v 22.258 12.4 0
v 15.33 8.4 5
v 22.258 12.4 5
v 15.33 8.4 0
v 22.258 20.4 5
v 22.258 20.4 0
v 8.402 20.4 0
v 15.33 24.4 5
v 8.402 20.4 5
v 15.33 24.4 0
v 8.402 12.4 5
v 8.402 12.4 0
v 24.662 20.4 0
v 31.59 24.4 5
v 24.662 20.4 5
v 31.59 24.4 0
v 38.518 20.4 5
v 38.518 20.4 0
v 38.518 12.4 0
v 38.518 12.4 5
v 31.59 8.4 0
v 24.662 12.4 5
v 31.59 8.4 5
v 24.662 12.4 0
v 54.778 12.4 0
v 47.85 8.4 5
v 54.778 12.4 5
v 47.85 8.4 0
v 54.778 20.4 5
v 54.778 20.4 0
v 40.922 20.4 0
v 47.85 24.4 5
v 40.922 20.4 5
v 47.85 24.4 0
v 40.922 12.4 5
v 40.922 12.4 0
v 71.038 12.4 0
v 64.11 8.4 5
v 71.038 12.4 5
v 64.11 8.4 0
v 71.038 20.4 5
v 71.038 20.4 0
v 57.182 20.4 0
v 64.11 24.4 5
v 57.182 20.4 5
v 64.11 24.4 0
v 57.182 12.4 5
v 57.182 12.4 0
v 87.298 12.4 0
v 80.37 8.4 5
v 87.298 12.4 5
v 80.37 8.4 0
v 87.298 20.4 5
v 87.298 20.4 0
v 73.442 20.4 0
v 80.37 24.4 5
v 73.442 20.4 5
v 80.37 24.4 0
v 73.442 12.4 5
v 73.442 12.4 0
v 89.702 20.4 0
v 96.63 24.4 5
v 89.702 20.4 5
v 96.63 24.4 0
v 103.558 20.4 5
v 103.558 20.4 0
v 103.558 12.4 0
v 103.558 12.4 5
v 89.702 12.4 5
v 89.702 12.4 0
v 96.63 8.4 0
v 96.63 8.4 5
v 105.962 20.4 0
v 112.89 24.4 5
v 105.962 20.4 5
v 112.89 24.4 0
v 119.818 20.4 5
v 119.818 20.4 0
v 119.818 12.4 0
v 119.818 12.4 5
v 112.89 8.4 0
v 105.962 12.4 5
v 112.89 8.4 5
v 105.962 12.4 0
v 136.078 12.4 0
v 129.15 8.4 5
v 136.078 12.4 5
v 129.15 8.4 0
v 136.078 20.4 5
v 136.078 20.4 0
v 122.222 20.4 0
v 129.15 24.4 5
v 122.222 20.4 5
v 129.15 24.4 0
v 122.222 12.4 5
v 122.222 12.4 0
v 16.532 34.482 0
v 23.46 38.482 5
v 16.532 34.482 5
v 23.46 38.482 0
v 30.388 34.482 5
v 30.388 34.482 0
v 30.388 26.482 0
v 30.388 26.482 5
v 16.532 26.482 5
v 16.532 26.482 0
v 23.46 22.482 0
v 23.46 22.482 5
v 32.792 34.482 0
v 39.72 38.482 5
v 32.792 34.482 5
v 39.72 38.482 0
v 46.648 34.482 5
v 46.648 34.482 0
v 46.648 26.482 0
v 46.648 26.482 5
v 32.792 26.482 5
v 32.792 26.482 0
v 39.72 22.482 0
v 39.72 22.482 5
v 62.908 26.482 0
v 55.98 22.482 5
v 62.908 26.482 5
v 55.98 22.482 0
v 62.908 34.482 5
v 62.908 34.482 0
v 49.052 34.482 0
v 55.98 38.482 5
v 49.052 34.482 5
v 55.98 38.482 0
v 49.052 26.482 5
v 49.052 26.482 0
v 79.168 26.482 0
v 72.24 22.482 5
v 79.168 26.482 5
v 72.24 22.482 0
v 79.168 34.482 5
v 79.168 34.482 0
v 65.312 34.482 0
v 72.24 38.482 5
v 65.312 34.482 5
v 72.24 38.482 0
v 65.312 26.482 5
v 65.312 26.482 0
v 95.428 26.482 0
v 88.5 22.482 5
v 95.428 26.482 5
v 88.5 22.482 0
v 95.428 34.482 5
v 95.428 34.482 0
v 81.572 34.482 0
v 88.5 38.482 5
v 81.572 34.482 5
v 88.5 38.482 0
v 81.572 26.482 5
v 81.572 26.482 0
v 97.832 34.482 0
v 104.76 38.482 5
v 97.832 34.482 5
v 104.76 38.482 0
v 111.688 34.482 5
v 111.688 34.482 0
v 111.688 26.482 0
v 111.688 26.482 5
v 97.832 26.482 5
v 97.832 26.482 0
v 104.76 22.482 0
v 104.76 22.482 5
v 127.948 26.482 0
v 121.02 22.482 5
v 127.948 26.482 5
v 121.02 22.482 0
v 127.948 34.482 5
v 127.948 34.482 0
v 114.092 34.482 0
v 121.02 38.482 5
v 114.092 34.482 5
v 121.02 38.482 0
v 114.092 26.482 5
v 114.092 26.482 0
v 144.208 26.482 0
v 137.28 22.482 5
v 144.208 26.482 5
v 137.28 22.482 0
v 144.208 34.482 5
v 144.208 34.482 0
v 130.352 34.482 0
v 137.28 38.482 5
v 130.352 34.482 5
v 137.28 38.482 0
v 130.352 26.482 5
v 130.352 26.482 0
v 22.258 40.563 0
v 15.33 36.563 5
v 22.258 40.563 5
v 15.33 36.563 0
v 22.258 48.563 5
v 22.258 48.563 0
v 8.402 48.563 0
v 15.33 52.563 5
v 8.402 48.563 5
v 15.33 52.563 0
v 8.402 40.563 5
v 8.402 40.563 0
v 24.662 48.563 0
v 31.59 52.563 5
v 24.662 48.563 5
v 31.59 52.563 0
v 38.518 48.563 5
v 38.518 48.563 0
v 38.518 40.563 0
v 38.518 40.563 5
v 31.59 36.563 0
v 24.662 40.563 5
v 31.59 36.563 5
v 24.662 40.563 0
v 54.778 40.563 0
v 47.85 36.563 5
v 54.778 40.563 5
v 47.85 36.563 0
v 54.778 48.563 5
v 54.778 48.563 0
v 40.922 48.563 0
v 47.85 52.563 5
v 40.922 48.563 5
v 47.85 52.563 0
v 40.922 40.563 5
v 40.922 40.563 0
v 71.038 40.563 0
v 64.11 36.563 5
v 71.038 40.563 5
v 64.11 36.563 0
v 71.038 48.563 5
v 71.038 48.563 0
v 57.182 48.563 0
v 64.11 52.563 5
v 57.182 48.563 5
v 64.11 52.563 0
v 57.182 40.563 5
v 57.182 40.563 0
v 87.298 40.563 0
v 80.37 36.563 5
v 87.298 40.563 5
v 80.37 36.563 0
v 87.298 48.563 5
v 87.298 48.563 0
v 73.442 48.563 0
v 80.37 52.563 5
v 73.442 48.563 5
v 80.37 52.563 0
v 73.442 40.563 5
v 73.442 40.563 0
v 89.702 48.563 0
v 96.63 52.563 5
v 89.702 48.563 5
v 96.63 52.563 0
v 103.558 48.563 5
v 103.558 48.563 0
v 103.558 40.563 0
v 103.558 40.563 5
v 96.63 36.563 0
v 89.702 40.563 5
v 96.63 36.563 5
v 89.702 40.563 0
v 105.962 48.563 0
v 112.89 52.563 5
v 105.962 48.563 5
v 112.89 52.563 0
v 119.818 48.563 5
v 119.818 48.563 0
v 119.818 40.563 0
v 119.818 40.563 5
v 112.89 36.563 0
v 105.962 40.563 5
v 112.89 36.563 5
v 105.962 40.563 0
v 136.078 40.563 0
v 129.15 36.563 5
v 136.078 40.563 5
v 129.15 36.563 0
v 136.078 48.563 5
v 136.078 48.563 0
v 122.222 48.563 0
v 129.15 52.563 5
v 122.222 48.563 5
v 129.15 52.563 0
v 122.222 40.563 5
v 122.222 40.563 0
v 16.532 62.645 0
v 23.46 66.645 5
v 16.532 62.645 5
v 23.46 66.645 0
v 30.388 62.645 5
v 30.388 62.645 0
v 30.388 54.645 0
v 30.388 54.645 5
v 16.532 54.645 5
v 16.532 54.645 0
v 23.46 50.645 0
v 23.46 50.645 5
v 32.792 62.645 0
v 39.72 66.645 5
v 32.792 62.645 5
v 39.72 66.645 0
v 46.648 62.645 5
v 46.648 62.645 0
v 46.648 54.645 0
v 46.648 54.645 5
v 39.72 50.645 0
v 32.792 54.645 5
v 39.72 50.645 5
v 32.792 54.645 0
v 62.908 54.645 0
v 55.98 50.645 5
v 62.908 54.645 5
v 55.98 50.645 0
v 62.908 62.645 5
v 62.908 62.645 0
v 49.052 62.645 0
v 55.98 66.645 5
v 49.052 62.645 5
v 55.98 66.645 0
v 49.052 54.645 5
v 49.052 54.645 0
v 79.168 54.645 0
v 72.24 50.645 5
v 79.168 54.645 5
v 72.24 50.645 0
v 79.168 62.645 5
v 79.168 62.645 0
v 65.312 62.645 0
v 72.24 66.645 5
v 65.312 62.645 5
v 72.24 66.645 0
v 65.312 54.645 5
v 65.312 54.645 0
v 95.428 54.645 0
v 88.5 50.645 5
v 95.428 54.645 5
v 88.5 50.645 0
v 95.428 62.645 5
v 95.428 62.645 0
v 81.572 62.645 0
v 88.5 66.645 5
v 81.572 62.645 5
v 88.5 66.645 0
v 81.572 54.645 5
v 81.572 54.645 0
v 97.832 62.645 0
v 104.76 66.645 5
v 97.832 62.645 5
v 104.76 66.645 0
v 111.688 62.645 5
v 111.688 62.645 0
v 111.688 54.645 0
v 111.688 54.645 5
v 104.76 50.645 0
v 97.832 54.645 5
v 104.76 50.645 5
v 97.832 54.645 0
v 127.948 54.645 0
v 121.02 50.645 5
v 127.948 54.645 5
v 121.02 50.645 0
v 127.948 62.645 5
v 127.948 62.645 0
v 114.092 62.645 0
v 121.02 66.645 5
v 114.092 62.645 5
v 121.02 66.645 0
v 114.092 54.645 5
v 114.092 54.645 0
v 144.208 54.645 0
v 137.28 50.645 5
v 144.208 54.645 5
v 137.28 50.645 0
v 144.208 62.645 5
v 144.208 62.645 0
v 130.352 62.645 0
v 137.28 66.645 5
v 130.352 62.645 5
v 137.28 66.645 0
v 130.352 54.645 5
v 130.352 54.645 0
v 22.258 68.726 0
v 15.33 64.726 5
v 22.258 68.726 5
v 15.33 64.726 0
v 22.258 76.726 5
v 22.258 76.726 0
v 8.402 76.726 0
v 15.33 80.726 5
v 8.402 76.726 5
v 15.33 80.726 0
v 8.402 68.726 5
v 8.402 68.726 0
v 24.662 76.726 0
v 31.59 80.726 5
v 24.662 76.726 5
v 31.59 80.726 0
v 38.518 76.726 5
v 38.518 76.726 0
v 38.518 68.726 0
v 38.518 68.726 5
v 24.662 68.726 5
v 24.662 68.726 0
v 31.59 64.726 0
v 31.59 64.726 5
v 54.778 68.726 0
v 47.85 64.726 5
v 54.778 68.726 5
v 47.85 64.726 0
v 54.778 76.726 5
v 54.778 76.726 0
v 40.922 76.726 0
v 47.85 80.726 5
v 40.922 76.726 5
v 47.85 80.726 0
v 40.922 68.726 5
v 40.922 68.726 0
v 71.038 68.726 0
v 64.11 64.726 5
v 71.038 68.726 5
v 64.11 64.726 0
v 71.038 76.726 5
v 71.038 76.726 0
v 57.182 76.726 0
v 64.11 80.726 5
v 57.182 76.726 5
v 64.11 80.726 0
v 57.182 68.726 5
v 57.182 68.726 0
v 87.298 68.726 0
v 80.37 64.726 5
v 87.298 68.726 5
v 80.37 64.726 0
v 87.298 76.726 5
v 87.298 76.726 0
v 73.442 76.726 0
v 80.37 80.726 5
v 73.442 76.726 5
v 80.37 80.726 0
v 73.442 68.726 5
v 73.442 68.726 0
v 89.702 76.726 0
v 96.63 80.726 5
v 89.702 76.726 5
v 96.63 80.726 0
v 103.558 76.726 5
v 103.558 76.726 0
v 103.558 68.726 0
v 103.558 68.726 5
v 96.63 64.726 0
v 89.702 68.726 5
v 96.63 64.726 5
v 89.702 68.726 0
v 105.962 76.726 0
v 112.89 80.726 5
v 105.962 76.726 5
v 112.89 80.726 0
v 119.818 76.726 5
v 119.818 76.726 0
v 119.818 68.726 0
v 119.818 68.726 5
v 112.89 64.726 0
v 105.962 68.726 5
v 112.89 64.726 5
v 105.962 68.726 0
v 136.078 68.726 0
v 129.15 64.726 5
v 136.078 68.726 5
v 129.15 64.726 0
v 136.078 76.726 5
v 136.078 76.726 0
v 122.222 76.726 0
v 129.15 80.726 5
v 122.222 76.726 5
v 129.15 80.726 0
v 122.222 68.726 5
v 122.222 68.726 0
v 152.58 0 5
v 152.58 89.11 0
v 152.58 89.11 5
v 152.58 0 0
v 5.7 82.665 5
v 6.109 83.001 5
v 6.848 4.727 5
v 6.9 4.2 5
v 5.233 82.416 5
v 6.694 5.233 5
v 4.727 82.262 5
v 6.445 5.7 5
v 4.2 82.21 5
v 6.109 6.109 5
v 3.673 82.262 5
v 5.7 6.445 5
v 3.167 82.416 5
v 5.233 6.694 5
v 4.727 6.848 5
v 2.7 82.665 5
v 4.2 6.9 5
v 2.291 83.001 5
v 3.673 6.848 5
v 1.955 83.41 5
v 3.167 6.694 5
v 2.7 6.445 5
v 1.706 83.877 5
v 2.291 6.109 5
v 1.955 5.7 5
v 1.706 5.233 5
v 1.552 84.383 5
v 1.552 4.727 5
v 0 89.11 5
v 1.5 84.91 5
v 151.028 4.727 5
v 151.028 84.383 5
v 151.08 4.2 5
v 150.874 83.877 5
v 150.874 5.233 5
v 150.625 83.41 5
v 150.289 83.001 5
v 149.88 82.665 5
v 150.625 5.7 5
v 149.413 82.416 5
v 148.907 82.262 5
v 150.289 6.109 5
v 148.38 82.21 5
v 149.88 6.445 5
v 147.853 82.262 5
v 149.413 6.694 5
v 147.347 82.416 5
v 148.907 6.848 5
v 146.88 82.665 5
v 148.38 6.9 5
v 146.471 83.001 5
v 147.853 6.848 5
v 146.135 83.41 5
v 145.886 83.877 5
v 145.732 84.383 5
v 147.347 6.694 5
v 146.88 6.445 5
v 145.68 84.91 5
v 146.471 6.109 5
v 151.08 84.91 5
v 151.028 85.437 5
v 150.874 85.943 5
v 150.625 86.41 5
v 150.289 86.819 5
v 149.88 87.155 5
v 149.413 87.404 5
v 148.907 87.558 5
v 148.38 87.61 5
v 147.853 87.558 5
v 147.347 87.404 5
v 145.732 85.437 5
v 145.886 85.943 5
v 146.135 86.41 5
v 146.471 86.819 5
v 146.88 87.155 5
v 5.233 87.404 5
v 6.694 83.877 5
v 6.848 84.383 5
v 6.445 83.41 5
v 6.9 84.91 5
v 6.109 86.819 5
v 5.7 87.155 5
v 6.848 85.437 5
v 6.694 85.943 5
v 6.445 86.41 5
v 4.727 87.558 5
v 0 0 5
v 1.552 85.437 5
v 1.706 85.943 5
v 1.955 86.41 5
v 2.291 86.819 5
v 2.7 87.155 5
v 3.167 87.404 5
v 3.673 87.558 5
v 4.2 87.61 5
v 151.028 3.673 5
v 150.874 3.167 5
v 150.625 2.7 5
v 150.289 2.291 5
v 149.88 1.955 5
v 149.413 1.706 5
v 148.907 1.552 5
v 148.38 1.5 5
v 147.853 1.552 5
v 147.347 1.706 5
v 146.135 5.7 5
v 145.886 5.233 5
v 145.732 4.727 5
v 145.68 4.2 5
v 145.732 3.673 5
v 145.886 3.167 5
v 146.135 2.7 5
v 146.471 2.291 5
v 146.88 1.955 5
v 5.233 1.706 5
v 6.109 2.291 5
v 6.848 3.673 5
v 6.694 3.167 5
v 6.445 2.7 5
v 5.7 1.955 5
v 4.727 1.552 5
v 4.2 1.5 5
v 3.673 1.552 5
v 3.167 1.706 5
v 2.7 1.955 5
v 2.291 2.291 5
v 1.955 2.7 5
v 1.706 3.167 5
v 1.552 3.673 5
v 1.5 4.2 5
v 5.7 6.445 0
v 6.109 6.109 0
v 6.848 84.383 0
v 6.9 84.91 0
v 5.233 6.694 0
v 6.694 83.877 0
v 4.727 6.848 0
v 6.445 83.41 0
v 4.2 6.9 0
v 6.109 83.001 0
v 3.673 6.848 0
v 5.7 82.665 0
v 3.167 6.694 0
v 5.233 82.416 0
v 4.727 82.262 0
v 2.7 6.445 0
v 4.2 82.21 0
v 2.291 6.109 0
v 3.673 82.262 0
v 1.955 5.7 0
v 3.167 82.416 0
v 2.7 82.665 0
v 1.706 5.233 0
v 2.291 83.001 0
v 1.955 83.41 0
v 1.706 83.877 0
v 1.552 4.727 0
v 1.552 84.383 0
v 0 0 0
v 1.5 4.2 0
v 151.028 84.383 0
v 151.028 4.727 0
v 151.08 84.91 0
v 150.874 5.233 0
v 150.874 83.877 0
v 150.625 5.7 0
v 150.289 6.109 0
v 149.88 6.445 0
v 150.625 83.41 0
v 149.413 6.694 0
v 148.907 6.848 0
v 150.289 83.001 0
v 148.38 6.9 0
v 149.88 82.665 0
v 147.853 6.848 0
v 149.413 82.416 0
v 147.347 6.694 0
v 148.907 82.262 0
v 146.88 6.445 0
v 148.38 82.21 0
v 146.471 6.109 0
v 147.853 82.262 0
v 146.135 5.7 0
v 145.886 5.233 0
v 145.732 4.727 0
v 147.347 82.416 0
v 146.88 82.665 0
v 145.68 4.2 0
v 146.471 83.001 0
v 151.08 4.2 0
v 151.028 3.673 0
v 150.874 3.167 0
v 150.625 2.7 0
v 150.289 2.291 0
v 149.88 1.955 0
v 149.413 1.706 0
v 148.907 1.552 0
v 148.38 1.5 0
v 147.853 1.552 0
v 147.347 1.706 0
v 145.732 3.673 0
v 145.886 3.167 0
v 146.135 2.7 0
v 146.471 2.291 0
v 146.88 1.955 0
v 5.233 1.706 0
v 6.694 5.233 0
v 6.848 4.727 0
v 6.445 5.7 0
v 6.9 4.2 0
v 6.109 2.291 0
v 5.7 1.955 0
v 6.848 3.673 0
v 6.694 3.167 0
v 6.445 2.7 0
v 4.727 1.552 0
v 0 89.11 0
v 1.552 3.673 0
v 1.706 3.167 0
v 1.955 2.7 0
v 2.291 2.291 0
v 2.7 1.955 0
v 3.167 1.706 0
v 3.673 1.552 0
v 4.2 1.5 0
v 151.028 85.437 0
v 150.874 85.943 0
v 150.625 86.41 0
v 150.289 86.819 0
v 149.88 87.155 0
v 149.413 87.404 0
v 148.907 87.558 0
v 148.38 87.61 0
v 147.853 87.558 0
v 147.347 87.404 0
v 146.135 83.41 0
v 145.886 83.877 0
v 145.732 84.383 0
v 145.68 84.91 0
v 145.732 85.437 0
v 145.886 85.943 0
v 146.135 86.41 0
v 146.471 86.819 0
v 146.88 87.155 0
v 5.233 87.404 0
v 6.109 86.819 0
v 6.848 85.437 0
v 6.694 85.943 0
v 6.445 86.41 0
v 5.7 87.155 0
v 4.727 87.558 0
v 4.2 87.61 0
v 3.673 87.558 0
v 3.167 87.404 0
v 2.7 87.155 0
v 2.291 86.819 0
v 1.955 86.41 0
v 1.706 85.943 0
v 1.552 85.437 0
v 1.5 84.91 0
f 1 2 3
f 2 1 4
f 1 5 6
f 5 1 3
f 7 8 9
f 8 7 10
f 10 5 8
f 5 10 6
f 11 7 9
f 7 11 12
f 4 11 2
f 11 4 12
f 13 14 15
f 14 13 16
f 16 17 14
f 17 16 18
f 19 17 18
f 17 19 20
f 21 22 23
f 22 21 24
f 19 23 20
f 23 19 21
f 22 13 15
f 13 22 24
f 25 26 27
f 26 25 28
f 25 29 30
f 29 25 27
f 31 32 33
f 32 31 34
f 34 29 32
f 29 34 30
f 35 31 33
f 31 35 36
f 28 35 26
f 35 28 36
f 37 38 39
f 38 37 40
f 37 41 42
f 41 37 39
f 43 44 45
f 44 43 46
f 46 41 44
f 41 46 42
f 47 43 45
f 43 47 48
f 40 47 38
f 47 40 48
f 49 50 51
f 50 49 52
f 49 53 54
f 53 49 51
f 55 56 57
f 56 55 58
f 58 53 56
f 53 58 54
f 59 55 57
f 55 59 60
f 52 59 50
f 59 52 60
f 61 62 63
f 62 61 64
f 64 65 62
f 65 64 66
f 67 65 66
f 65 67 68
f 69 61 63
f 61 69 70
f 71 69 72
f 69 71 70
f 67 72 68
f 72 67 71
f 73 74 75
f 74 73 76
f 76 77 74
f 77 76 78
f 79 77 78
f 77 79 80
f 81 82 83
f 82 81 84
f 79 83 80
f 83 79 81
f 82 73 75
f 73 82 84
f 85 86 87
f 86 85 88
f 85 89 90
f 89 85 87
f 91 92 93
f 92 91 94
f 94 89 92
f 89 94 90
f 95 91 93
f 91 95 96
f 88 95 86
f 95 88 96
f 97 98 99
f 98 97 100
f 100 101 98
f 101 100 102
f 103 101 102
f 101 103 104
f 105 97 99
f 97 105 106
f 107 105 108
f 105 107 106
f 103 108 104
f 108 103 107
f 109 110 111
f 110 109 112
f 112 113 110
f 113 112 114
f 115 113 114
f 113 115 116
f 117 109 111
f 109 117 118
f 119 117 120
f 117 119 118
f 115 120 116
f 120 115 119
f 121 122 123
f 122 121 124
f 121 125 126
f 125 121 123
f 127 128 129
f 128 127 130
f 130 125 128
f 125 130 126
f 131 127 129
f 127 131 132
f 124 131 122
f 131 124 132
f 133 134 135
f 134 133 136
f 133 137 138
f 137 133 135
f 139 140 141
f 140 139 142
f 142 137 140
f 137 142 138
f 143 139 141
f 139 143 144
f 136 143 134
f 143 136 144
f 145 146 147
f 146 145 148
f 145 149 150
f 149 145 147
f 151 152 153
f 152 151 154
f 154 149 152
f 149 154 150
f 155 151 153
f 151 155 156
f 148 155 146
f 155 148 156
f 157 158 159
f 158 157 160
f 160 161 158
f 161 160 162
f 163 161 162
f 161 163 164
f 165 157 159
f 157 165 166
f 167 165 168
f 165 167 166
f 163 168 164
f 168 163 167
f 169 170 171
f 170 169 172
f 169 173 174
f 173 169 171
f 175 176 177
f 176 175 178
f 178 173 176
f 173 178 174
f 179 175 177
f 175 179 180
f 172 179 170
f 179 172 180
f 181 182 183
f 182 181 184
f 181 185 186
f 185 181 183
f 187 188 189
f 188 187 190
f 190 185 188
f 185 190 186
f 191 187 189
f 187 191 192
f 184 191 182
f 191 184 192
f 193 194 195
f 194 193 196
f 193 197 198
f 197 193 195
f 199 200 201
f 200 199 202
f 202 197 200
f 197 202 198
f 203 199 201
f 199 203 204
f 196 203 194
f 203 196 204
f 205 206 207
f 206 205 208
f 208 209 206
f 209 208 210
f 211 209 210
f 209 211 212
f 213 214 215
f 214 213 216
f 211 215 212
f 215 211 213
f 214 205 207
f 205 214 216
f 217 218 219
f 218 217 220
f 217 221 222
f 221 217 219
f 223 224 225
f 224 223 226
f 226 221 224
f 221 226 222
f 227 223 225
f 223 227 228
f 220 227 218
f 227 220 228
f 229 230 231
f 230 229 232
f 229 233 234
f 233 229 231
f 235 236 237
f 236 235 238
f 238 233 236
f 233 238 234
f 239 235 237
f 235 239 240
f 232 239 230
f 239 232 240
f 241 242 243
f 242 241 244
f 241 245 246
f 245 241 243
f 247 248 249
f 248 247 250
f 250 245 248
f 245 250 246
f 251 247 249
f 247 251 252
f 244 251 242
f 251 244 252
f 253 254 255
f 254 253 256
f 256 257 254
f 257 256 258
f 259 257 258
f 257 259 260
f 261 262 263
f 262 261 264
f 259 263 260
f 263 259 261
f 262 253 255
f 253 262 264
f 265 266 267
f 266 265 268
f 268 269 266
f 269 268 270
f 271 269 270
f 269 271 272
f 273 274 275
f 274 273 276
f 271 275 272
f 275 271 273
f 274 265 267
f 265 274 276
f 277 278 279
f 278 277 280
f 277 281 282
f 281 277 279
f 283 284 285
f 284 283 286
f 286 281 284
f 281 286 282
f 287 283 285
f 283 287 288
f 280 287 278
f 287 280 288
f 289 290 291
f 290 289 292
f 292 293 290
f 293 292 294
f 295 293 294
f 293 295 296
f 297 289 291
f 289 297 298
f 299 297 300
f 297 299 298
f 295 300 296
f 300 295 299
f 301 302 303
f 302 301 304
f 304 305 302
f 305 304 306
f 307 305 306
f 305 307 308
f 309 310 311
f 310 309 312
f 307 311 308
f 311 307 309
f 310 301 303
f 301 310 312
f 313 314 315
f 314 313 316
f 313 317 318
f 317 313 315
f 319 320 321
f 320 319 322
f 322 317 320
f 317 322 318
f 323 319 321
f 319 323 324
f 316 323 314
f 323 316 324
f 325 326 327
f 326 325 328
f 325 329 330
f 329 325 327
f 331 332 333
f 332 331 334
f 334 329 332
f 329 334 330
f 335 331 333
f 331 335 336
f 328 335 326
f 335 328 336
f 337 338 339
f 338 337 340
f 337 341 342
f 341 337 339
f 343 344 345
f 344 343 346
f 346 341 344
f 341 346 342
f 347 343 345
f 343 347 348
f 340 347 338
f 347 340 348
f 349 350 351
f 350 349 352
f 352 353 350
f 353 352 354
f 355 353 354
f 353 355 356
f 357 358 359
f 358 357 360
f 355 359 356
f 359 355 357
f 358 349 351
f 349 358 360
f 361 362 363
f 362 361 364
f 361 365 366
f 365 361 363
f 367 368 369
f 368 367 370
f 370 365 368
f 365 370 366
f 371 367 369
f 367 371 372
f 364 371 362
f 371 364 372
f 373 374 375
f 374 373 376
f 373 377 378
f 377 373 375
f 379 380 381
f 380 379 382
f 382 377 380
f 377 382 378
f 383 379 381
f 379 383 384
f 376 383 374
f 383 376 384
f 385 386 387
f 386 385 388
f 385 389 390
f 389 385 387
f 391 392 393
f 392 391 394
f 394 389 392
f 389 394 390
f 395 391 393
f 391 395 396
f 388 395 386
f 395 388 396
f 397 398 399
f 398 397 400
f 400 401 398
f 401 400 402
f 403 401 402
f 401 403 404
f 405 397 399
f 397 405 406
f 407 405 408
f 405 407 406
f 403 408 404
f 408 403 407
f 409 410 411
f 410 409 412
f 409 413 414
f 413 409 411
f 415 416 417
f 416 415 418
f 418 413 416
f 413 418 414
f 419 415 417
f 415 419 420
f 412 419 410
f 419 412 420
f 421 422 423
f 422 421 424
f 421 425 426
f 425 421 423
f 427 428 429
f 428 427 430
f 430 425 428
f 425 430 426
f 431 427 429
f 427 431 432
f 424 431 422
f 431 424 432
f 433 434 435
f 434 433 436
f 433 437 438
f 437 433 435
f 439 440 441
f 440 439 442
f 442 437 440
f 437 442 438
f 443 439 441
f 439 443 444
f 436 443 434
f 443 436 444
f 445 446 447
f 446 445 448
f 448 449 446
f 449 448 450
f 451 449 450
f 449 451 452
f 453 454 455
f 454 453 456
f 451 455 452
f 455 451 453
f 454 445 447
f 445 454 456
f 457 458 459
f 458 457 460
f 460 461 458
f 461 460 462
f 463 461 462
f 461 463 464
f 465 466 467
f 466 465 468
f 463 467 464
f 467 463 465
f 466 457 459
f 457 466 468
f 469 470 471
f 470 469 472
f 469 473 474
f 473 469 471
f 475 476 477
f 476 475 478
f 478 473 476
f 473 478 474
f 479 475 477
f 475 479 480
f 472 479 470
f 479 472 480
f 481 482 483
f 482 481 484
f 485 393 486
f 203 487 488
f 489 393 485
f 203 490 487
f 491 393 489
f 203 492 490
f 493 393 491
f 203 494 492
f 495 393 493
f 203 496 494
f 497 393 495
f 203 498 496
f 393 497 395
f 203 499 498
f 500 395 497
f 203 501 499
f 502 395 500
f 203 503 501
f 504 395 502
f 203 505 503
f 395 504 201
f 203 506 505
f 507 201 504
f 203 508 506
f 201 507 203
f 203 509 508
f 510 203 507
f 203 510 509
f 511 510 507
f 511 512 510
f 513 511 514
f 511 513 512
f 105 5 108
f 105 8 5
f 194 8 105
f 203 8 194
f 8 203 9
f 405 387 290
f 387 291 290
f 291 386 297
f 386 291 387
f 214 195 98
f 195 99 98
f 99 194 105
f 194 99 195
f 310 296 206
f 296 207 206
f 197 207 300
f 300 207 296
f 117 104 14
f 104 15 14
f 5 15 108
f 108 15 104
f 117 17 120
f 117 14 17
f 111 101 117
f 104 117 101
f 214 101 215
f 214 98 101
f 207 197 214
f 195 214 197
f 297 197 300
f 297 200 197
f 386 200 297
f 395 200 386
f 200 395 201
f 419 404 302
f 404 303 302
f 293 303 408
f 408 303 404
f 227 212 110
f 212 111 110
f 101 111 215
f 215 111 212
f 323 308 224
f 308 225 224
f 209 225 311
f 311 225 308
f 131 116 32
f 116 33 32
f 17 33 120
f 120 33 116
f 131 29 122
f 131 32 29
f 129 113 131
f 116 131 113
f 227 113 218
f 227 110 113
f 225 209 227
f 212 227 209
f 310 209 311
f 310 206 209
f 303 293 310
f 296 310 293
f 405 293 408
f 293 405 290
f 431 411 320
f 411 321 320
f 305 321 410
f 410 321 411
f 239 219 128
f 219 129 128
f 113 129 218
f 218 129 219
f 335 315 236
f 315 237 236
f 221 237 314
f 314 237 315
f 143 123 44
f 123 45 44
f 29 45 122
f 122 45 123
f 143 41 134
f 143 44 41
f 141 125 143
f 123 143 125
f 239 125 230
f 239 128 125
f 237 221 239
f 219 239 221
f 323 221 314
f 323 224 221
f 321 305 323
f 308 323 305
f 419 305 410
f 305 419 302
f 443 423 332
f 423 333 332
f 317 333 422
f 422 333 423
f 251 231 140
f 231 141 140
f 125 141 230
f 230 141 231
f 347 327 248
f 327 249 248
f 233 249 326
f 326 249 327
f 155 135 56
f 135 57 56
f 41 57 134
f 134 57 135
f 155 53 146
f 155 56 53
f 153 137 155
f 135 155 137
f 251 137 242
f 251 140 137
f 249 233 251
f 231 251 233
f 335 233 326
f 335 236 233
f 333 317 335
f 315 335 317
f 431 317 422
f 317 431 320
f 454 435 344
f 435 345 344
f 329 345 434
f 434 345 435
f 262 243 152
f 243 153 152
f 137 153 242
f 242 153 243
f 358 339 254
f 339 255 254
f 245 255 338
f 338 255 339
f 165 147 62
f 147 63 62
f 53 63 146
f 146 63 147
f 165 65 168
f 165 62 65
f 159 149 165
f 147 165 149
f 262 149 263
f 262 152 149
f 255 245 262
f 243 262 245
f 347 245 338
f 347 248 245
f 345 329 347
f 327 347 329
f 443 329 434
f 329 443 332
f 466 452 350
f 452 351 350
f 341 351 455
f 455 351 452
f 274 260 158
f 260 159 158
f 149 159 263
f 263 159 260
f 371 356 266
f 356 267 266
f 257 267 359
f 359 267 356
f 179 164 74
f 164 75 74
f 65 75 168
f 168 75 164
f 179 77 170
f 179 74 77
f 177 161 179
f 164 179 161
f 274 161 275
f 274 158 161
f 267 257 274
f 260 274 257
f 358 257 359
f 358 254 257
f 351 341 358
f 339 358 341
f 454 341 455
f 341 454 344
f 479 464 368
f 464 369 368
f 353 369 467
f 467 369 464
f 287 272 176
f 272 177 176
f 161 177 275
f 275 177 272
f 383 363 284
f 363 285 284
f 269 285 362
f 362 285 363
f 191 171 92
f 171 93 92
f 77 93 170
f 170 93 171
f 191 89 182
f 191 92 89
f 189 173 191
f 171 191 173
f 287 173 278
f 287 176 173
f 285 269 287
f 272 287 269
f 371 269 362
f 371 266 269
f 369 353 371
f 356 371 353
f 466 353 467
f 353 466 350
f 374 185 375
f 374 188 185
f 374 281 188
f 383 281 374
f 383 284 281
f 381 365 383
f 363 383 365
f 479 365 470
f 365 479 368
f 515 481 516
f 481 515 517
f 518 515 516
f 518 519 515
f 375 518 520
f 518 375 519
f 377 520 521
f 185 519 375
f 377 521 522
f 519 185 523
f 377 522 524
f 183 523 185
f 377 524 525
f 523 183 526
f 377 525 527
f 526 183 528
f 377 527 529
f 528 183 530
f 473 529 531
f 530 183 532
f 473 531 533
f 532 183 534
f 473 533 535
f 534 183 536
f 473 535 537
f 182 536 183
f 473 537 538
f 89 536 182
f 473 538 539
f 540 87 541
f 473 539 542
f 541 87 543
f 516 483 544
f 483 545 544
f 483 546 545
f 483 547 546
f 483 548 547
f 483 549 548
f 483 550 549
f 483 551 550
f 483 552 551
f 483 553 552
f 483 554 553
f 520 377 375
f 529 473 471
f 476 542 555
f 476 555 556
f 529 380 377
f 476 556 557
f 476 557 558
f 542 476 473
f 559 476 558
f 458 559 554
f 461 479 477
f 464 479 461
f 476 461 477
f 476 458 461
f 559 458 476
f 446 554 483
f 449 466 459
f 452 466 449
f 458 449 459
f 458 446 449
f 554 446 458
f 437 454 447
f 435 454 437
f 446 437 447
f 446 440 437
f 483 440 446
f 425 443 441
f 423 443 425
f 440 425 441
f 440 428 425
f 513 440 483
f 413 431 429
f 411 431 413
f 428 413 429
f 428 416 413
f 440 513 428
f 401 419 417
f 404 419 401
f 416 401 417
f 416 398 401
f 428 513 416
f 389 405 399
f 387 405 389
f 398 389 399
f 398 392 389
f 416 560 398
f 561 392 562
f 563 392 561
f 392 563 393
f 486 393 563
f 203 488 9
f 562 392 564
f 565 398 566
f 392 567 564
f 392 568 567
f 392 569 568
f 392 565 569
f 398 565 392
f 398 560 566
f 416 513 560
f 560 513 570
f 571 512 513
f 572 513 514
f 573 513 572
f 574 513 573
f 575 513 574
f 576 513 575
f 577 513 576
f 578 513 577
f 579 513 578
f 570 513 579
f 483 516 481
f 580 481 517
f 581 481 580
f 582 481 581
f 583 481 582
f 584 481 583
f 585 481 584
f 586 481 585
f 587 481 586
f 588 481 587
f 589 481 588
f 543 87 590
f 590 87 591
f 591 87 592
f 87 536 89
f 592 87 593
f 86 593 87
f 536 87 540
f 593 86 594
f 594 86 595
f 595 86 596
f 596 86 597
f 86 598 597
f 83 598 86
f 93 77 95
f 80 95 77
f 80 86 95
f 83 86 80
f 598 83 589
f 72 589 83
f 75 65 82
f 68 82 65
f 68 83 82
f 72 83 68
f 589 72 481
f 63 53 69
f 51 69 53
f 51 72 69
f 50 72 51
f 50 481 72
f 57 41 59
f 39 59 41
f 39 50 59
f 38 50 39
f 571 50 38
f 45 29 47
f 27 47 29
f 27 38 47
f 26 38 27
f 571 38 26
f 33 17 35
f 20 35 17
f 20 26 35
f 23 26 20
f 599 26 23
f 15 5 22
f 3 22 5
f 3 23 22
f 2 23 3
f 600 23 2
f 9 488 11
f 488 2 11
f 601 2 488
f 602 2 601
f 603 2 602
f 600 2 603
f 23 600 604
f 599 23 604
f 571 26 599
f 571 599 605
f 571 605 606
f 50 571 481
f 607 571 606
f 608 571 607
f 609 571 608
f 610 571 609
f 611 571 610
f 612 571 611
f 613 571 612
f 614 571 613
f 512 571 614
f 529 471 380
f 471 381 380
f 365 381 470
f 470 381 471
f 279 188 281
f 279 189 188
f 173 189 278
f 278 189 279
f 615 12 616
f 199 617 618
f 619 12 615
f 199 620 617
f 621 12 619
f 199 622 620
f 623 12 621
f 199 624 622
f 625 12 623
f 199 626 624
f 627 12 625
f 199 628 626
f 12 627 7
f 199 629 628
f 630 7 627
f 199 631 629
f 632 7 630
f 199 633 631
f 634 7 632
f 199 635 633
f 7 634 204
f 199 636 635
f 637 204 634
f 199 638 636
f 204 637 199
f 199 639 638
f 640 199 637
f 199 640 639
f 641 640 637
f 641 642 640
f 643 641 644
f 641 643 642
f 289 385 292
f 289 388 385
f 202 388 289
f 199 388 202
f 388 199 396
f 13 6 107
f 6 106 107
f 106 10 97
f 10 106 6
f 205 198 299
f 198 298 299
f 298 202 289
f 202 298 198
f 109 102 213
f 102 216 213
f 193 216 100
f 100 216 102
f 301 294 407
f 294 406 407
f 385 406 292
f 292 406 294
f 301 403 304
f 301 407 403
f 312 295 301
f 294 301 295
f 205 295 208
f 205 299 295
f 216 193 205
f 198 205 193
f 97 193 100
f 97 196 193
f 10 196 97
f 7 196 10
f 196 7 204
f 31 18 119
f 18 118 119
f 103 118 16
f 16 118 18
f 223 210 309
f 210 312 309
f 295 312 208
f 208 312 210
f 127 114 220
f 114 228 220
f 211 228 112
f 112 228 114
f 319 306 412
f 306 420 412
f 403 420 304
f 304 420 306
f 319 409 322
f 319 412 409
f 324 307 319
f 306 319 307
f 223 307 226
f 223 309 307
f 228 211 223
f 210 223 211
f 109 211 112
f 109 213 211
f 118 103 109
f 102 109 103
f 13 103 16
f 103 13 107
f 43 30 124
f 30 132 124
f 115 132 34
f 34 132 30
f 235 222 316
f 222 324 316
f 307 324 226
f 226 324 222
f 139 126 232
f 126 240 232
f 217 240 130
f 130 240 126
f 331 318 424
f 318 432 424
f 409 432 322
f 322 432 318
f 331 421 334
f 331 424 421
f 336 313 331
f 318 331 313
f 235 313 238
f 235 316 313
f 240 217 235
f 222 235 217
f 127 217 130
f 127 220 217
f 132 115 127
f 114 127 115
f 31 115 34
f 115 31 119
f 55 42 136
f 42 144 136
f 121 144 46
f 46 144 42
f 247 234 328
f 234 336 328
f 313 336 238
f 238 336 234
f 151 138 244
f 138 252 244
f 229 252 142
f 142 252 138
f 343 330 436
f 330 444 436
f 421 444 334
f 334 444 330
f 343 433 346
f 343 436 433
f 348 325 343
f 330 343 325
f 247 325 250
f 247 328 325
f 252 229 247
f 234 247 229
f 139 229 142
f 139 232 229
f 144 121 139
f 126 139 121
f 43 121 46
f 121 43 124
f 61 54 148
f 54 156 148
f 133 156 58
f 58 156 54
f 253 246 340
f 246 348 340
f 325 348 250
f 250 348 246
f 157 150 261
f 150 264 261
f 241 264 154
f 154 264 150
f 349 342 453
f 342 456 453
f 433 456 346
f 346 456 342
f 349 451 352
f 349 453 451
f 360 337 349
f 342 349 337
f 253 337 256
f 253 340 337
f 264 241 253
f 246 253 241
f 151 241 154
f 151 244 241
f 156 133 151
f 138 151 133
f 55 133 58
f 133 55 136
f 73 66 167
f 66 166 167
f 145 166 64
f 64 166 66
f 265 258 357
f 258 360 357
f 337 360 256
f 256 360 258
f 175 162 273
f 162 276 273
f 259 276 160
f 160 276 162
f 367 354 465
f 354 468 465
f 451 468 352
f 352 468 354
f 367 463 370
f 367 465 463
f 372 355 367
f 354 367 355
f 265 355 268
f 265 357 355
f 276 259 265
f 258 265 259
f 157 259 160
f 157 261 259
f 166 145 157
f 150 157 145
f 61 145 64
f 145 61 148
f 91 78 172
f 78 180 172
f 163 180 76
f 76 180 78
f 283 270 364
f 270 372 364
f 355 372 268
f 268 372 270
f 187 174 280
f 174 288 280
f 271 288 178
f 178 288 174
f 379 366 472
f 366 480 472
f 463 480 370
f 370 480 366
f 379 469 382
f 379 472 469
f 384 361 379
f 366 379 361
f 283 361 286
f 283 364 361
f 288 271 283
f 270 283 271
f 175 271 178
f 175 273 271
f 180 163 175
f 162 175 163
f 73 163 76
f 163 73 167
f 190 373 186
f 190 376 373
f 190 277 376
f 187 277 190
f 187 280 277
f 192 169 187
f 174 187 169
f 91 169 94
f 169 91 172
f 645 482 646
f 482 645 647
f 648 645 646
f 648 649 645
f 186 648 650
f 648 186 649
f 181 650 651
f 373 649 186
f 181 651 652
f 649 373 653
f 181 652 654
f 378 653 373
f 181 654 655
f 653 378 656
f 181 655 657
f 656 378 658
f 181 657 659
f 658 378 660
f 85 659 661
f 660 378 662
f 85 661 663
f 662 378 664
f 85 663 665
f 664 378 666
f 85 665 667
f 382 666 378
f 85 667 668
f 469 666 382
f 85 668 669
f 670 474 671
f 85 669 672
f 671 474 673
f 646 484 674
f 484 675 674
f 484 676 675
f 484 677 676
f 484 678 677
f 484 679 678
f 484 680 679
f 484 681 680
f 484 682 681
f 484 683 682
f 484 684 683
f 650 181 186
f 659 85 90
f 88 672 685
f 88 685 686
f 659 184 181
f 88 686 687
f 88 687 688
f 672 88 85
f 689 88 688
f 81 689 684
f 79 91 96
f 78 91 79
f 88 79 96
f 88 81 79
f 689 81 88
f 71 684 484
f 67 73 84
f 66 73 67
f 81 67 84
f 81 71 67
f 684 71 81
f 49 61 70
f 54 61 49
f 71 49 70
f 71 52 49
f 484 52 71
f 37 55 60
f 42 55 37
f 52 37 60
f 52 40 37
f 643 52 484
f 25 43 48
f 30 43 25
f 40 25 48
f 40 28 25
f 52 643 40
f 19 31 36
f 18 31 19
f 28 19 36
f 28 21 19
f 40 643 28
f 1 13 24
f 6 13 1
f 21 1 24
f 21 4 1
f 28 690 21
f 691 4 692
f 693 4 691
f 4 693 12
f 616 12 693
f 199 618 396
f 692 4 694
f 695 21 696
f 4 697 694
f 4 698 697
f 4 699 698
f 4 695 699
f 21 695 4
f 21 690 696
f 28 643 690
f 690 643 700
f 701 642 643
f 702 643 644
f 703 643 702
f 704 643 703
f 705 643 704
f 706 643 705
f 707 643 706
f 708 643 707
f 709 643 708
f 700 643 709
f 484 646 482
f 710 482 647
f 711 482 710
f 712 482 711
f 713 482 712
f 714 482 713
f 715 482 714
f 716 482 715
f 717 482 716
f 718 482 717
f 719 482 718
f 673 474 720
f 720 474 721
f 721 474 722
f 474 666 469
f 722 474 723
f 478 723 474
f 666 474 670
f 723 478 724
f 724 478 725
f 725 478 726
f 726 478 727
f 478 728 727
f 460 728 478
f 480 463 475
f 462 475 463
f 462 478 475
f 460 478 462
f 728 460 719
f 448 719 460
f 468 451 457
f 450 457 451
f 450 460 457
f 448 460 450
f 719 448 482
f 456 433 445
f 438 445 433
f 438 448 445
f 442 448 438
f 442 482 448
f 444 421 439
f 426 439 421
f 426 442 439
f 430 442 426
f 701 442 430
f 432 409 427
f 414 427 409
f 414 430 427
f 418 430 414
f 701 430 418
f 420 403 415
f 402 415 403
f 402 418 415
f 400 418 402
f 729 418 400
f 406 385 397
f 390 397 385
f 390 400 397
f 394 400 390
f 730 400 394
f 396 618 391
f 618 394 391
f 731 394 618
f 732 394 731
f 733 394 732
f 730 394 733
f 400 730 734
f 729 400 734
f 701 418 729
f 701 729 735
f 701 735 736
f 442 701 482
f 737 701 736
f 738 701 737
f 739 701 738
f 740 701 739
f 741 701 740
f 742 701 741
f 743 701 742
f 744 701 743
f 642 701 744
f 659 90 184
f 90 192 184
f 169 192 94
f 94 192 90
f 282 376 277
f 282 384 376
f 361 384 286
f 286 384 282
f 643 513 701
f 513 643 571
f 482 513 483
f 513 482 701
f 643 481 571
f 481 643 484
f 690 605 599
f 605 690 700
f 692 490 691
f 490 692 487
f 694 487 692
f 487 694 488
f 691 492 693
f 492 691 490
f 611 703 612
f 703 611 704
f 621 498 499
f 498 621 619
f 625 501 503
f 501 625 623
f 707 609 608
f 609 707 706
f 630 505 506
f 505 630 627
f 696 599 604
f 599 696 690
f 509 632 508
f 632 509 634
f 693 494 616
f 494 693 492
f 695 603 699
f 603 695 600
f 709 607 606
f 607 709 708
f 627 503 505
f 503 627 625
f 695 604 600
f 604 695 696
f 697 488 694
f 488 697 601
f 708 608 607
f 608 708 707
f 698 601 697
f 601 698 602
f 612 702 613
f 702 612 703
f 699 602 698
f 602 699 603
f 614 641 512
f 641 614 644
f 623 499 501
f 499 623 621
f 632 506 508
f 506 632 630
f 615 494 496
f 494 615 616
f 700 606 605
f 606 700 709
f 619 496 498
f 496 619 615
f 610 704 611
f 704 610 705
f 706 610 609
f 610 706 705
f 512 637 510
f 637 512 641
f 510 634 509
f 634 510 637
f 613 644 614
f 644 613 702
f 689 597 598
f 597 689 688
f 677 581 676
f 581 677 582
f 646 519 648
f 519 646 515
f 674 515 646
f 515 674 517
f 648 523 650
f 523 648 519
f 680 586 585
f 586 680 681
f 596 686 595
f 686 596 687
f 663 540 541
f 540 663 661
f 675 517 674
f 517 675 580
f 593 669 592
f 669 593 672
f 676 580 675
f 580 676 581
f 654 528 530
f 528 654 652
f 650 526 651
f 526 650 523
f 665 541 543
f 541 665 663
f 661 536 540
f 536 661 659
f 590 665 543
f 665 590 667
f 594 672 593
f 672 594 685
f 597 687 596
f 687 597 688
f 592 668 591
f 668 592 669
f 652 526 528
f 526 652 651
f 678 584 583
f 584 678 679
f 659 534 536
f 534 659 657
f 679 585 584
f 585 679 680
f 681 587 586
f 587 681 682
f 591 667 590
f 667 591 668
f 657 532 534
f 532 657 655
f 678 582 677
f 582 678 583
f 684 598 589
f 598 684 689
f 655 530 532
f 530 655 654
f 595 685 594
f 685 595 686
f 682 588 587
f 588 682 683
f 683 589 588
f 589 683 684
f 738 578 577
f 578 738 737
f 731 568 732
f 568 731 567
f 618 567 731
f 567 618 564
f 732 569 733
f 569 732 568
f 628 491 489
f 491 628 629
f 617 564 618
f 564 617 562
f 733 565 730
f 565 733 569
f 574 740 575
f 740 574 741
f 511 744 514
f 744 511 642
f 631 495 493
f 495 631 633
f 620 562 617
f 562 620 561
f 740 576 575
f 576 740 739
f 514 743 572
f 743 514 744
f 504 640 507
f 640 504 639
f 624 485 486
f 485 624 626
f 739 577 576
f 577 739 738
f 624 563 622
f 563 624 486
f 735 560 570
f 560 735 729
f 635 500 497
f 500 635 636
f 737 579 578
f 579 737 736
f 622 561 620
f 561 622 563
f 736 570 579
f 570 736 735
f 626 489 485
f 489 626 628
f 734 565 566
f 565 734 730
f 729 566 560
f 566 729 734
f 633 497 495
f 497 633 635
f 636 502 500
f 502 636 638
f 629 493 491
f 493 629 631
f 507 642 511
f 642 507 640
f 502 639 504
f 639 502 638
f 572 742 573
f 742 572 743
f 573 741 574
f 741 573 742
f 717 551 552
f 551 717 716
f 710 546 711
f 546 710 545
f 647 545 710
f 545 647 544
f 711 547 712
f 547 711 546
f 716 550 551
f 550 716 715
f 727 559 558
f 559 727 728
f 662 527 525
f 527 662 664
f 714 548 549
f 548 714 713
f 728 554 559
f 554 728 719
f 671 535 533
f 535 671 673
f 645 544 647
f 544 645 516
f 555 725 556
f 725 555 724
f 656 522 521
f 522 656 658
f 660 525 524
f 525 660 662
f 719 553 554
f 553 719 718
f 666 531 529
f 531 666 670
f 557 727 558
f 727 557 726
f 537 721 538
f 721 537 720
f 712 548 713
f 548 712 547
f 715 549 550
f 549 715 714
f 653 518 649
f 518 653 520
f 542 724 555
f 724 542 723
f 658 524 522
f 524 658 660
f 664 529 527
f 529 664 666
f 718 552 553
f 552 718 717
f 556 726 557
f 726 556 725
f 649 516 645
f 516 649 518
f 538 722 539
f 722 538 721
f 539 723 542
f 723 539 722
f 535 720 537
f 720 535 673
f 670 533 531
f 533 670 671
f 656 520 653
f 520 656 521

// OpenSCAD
$fn = 32;

// ----------------------------------------------------------------------
// Honeycomb panel: 152.58 x 89.11 mm, 40 cells of 16 mm
// ----------------------------------------------------------------------

// --- parameters (mm) ---
panel_w = 152.58;         // panel width
panel_d = 89.11;          // panel depth
thick = 5;                // panel thickness
cell_r = 8;               // hex cell circumradius
pitch = 16.26;            // hex cell pitch (centre to centre)
web = 2.4;                // web between the cells
columns = 8;              // columns of cells
rows = 5;                 // rows of cells
cell_count = 40;          // total cells
shift_x = 15.33;          // first cell offset in x
shift_y = 16.4;           // first cell offset in y
mount_d = 5.4;            // corner mounting holes
hole_off = 4.2;           // mounting hole offset from the corners

difference() {
  union() {
    cube([panel_w, panel_d, thick]);
  }
  /* hexagonal cells, point-up, cut right through the plate */
  for (row = [0 : rows - 1]) {
    for (col = [0 : columns - 1]) {
      translate([shift_x + col * pitch + (row % 2) * pitch / 2, shift_y + row * pitch * 0.866025, -2.5]) rotate([0, 0, 30]) cylinder(h = thick + 5, d = 2 * cell_r, $fn = 6);
    }
  }
  /* corner mounting holes, clear of the outer cell web */
  translate([4.2, 4.2, -2.5]) cylinder(h = thick + 5, d = mount_d);
  translate([148.38, 4.2, -2.5]) cylinder(h = thick + 5, d = mount_d);
  translate([4.2, 84.91, -2.5]) cylinder(h = thick + 5, d = mount_d);
  translate([148.38, 84.91, -2.5]) cylinder(h = thick + 5, d = mount_d);
}
